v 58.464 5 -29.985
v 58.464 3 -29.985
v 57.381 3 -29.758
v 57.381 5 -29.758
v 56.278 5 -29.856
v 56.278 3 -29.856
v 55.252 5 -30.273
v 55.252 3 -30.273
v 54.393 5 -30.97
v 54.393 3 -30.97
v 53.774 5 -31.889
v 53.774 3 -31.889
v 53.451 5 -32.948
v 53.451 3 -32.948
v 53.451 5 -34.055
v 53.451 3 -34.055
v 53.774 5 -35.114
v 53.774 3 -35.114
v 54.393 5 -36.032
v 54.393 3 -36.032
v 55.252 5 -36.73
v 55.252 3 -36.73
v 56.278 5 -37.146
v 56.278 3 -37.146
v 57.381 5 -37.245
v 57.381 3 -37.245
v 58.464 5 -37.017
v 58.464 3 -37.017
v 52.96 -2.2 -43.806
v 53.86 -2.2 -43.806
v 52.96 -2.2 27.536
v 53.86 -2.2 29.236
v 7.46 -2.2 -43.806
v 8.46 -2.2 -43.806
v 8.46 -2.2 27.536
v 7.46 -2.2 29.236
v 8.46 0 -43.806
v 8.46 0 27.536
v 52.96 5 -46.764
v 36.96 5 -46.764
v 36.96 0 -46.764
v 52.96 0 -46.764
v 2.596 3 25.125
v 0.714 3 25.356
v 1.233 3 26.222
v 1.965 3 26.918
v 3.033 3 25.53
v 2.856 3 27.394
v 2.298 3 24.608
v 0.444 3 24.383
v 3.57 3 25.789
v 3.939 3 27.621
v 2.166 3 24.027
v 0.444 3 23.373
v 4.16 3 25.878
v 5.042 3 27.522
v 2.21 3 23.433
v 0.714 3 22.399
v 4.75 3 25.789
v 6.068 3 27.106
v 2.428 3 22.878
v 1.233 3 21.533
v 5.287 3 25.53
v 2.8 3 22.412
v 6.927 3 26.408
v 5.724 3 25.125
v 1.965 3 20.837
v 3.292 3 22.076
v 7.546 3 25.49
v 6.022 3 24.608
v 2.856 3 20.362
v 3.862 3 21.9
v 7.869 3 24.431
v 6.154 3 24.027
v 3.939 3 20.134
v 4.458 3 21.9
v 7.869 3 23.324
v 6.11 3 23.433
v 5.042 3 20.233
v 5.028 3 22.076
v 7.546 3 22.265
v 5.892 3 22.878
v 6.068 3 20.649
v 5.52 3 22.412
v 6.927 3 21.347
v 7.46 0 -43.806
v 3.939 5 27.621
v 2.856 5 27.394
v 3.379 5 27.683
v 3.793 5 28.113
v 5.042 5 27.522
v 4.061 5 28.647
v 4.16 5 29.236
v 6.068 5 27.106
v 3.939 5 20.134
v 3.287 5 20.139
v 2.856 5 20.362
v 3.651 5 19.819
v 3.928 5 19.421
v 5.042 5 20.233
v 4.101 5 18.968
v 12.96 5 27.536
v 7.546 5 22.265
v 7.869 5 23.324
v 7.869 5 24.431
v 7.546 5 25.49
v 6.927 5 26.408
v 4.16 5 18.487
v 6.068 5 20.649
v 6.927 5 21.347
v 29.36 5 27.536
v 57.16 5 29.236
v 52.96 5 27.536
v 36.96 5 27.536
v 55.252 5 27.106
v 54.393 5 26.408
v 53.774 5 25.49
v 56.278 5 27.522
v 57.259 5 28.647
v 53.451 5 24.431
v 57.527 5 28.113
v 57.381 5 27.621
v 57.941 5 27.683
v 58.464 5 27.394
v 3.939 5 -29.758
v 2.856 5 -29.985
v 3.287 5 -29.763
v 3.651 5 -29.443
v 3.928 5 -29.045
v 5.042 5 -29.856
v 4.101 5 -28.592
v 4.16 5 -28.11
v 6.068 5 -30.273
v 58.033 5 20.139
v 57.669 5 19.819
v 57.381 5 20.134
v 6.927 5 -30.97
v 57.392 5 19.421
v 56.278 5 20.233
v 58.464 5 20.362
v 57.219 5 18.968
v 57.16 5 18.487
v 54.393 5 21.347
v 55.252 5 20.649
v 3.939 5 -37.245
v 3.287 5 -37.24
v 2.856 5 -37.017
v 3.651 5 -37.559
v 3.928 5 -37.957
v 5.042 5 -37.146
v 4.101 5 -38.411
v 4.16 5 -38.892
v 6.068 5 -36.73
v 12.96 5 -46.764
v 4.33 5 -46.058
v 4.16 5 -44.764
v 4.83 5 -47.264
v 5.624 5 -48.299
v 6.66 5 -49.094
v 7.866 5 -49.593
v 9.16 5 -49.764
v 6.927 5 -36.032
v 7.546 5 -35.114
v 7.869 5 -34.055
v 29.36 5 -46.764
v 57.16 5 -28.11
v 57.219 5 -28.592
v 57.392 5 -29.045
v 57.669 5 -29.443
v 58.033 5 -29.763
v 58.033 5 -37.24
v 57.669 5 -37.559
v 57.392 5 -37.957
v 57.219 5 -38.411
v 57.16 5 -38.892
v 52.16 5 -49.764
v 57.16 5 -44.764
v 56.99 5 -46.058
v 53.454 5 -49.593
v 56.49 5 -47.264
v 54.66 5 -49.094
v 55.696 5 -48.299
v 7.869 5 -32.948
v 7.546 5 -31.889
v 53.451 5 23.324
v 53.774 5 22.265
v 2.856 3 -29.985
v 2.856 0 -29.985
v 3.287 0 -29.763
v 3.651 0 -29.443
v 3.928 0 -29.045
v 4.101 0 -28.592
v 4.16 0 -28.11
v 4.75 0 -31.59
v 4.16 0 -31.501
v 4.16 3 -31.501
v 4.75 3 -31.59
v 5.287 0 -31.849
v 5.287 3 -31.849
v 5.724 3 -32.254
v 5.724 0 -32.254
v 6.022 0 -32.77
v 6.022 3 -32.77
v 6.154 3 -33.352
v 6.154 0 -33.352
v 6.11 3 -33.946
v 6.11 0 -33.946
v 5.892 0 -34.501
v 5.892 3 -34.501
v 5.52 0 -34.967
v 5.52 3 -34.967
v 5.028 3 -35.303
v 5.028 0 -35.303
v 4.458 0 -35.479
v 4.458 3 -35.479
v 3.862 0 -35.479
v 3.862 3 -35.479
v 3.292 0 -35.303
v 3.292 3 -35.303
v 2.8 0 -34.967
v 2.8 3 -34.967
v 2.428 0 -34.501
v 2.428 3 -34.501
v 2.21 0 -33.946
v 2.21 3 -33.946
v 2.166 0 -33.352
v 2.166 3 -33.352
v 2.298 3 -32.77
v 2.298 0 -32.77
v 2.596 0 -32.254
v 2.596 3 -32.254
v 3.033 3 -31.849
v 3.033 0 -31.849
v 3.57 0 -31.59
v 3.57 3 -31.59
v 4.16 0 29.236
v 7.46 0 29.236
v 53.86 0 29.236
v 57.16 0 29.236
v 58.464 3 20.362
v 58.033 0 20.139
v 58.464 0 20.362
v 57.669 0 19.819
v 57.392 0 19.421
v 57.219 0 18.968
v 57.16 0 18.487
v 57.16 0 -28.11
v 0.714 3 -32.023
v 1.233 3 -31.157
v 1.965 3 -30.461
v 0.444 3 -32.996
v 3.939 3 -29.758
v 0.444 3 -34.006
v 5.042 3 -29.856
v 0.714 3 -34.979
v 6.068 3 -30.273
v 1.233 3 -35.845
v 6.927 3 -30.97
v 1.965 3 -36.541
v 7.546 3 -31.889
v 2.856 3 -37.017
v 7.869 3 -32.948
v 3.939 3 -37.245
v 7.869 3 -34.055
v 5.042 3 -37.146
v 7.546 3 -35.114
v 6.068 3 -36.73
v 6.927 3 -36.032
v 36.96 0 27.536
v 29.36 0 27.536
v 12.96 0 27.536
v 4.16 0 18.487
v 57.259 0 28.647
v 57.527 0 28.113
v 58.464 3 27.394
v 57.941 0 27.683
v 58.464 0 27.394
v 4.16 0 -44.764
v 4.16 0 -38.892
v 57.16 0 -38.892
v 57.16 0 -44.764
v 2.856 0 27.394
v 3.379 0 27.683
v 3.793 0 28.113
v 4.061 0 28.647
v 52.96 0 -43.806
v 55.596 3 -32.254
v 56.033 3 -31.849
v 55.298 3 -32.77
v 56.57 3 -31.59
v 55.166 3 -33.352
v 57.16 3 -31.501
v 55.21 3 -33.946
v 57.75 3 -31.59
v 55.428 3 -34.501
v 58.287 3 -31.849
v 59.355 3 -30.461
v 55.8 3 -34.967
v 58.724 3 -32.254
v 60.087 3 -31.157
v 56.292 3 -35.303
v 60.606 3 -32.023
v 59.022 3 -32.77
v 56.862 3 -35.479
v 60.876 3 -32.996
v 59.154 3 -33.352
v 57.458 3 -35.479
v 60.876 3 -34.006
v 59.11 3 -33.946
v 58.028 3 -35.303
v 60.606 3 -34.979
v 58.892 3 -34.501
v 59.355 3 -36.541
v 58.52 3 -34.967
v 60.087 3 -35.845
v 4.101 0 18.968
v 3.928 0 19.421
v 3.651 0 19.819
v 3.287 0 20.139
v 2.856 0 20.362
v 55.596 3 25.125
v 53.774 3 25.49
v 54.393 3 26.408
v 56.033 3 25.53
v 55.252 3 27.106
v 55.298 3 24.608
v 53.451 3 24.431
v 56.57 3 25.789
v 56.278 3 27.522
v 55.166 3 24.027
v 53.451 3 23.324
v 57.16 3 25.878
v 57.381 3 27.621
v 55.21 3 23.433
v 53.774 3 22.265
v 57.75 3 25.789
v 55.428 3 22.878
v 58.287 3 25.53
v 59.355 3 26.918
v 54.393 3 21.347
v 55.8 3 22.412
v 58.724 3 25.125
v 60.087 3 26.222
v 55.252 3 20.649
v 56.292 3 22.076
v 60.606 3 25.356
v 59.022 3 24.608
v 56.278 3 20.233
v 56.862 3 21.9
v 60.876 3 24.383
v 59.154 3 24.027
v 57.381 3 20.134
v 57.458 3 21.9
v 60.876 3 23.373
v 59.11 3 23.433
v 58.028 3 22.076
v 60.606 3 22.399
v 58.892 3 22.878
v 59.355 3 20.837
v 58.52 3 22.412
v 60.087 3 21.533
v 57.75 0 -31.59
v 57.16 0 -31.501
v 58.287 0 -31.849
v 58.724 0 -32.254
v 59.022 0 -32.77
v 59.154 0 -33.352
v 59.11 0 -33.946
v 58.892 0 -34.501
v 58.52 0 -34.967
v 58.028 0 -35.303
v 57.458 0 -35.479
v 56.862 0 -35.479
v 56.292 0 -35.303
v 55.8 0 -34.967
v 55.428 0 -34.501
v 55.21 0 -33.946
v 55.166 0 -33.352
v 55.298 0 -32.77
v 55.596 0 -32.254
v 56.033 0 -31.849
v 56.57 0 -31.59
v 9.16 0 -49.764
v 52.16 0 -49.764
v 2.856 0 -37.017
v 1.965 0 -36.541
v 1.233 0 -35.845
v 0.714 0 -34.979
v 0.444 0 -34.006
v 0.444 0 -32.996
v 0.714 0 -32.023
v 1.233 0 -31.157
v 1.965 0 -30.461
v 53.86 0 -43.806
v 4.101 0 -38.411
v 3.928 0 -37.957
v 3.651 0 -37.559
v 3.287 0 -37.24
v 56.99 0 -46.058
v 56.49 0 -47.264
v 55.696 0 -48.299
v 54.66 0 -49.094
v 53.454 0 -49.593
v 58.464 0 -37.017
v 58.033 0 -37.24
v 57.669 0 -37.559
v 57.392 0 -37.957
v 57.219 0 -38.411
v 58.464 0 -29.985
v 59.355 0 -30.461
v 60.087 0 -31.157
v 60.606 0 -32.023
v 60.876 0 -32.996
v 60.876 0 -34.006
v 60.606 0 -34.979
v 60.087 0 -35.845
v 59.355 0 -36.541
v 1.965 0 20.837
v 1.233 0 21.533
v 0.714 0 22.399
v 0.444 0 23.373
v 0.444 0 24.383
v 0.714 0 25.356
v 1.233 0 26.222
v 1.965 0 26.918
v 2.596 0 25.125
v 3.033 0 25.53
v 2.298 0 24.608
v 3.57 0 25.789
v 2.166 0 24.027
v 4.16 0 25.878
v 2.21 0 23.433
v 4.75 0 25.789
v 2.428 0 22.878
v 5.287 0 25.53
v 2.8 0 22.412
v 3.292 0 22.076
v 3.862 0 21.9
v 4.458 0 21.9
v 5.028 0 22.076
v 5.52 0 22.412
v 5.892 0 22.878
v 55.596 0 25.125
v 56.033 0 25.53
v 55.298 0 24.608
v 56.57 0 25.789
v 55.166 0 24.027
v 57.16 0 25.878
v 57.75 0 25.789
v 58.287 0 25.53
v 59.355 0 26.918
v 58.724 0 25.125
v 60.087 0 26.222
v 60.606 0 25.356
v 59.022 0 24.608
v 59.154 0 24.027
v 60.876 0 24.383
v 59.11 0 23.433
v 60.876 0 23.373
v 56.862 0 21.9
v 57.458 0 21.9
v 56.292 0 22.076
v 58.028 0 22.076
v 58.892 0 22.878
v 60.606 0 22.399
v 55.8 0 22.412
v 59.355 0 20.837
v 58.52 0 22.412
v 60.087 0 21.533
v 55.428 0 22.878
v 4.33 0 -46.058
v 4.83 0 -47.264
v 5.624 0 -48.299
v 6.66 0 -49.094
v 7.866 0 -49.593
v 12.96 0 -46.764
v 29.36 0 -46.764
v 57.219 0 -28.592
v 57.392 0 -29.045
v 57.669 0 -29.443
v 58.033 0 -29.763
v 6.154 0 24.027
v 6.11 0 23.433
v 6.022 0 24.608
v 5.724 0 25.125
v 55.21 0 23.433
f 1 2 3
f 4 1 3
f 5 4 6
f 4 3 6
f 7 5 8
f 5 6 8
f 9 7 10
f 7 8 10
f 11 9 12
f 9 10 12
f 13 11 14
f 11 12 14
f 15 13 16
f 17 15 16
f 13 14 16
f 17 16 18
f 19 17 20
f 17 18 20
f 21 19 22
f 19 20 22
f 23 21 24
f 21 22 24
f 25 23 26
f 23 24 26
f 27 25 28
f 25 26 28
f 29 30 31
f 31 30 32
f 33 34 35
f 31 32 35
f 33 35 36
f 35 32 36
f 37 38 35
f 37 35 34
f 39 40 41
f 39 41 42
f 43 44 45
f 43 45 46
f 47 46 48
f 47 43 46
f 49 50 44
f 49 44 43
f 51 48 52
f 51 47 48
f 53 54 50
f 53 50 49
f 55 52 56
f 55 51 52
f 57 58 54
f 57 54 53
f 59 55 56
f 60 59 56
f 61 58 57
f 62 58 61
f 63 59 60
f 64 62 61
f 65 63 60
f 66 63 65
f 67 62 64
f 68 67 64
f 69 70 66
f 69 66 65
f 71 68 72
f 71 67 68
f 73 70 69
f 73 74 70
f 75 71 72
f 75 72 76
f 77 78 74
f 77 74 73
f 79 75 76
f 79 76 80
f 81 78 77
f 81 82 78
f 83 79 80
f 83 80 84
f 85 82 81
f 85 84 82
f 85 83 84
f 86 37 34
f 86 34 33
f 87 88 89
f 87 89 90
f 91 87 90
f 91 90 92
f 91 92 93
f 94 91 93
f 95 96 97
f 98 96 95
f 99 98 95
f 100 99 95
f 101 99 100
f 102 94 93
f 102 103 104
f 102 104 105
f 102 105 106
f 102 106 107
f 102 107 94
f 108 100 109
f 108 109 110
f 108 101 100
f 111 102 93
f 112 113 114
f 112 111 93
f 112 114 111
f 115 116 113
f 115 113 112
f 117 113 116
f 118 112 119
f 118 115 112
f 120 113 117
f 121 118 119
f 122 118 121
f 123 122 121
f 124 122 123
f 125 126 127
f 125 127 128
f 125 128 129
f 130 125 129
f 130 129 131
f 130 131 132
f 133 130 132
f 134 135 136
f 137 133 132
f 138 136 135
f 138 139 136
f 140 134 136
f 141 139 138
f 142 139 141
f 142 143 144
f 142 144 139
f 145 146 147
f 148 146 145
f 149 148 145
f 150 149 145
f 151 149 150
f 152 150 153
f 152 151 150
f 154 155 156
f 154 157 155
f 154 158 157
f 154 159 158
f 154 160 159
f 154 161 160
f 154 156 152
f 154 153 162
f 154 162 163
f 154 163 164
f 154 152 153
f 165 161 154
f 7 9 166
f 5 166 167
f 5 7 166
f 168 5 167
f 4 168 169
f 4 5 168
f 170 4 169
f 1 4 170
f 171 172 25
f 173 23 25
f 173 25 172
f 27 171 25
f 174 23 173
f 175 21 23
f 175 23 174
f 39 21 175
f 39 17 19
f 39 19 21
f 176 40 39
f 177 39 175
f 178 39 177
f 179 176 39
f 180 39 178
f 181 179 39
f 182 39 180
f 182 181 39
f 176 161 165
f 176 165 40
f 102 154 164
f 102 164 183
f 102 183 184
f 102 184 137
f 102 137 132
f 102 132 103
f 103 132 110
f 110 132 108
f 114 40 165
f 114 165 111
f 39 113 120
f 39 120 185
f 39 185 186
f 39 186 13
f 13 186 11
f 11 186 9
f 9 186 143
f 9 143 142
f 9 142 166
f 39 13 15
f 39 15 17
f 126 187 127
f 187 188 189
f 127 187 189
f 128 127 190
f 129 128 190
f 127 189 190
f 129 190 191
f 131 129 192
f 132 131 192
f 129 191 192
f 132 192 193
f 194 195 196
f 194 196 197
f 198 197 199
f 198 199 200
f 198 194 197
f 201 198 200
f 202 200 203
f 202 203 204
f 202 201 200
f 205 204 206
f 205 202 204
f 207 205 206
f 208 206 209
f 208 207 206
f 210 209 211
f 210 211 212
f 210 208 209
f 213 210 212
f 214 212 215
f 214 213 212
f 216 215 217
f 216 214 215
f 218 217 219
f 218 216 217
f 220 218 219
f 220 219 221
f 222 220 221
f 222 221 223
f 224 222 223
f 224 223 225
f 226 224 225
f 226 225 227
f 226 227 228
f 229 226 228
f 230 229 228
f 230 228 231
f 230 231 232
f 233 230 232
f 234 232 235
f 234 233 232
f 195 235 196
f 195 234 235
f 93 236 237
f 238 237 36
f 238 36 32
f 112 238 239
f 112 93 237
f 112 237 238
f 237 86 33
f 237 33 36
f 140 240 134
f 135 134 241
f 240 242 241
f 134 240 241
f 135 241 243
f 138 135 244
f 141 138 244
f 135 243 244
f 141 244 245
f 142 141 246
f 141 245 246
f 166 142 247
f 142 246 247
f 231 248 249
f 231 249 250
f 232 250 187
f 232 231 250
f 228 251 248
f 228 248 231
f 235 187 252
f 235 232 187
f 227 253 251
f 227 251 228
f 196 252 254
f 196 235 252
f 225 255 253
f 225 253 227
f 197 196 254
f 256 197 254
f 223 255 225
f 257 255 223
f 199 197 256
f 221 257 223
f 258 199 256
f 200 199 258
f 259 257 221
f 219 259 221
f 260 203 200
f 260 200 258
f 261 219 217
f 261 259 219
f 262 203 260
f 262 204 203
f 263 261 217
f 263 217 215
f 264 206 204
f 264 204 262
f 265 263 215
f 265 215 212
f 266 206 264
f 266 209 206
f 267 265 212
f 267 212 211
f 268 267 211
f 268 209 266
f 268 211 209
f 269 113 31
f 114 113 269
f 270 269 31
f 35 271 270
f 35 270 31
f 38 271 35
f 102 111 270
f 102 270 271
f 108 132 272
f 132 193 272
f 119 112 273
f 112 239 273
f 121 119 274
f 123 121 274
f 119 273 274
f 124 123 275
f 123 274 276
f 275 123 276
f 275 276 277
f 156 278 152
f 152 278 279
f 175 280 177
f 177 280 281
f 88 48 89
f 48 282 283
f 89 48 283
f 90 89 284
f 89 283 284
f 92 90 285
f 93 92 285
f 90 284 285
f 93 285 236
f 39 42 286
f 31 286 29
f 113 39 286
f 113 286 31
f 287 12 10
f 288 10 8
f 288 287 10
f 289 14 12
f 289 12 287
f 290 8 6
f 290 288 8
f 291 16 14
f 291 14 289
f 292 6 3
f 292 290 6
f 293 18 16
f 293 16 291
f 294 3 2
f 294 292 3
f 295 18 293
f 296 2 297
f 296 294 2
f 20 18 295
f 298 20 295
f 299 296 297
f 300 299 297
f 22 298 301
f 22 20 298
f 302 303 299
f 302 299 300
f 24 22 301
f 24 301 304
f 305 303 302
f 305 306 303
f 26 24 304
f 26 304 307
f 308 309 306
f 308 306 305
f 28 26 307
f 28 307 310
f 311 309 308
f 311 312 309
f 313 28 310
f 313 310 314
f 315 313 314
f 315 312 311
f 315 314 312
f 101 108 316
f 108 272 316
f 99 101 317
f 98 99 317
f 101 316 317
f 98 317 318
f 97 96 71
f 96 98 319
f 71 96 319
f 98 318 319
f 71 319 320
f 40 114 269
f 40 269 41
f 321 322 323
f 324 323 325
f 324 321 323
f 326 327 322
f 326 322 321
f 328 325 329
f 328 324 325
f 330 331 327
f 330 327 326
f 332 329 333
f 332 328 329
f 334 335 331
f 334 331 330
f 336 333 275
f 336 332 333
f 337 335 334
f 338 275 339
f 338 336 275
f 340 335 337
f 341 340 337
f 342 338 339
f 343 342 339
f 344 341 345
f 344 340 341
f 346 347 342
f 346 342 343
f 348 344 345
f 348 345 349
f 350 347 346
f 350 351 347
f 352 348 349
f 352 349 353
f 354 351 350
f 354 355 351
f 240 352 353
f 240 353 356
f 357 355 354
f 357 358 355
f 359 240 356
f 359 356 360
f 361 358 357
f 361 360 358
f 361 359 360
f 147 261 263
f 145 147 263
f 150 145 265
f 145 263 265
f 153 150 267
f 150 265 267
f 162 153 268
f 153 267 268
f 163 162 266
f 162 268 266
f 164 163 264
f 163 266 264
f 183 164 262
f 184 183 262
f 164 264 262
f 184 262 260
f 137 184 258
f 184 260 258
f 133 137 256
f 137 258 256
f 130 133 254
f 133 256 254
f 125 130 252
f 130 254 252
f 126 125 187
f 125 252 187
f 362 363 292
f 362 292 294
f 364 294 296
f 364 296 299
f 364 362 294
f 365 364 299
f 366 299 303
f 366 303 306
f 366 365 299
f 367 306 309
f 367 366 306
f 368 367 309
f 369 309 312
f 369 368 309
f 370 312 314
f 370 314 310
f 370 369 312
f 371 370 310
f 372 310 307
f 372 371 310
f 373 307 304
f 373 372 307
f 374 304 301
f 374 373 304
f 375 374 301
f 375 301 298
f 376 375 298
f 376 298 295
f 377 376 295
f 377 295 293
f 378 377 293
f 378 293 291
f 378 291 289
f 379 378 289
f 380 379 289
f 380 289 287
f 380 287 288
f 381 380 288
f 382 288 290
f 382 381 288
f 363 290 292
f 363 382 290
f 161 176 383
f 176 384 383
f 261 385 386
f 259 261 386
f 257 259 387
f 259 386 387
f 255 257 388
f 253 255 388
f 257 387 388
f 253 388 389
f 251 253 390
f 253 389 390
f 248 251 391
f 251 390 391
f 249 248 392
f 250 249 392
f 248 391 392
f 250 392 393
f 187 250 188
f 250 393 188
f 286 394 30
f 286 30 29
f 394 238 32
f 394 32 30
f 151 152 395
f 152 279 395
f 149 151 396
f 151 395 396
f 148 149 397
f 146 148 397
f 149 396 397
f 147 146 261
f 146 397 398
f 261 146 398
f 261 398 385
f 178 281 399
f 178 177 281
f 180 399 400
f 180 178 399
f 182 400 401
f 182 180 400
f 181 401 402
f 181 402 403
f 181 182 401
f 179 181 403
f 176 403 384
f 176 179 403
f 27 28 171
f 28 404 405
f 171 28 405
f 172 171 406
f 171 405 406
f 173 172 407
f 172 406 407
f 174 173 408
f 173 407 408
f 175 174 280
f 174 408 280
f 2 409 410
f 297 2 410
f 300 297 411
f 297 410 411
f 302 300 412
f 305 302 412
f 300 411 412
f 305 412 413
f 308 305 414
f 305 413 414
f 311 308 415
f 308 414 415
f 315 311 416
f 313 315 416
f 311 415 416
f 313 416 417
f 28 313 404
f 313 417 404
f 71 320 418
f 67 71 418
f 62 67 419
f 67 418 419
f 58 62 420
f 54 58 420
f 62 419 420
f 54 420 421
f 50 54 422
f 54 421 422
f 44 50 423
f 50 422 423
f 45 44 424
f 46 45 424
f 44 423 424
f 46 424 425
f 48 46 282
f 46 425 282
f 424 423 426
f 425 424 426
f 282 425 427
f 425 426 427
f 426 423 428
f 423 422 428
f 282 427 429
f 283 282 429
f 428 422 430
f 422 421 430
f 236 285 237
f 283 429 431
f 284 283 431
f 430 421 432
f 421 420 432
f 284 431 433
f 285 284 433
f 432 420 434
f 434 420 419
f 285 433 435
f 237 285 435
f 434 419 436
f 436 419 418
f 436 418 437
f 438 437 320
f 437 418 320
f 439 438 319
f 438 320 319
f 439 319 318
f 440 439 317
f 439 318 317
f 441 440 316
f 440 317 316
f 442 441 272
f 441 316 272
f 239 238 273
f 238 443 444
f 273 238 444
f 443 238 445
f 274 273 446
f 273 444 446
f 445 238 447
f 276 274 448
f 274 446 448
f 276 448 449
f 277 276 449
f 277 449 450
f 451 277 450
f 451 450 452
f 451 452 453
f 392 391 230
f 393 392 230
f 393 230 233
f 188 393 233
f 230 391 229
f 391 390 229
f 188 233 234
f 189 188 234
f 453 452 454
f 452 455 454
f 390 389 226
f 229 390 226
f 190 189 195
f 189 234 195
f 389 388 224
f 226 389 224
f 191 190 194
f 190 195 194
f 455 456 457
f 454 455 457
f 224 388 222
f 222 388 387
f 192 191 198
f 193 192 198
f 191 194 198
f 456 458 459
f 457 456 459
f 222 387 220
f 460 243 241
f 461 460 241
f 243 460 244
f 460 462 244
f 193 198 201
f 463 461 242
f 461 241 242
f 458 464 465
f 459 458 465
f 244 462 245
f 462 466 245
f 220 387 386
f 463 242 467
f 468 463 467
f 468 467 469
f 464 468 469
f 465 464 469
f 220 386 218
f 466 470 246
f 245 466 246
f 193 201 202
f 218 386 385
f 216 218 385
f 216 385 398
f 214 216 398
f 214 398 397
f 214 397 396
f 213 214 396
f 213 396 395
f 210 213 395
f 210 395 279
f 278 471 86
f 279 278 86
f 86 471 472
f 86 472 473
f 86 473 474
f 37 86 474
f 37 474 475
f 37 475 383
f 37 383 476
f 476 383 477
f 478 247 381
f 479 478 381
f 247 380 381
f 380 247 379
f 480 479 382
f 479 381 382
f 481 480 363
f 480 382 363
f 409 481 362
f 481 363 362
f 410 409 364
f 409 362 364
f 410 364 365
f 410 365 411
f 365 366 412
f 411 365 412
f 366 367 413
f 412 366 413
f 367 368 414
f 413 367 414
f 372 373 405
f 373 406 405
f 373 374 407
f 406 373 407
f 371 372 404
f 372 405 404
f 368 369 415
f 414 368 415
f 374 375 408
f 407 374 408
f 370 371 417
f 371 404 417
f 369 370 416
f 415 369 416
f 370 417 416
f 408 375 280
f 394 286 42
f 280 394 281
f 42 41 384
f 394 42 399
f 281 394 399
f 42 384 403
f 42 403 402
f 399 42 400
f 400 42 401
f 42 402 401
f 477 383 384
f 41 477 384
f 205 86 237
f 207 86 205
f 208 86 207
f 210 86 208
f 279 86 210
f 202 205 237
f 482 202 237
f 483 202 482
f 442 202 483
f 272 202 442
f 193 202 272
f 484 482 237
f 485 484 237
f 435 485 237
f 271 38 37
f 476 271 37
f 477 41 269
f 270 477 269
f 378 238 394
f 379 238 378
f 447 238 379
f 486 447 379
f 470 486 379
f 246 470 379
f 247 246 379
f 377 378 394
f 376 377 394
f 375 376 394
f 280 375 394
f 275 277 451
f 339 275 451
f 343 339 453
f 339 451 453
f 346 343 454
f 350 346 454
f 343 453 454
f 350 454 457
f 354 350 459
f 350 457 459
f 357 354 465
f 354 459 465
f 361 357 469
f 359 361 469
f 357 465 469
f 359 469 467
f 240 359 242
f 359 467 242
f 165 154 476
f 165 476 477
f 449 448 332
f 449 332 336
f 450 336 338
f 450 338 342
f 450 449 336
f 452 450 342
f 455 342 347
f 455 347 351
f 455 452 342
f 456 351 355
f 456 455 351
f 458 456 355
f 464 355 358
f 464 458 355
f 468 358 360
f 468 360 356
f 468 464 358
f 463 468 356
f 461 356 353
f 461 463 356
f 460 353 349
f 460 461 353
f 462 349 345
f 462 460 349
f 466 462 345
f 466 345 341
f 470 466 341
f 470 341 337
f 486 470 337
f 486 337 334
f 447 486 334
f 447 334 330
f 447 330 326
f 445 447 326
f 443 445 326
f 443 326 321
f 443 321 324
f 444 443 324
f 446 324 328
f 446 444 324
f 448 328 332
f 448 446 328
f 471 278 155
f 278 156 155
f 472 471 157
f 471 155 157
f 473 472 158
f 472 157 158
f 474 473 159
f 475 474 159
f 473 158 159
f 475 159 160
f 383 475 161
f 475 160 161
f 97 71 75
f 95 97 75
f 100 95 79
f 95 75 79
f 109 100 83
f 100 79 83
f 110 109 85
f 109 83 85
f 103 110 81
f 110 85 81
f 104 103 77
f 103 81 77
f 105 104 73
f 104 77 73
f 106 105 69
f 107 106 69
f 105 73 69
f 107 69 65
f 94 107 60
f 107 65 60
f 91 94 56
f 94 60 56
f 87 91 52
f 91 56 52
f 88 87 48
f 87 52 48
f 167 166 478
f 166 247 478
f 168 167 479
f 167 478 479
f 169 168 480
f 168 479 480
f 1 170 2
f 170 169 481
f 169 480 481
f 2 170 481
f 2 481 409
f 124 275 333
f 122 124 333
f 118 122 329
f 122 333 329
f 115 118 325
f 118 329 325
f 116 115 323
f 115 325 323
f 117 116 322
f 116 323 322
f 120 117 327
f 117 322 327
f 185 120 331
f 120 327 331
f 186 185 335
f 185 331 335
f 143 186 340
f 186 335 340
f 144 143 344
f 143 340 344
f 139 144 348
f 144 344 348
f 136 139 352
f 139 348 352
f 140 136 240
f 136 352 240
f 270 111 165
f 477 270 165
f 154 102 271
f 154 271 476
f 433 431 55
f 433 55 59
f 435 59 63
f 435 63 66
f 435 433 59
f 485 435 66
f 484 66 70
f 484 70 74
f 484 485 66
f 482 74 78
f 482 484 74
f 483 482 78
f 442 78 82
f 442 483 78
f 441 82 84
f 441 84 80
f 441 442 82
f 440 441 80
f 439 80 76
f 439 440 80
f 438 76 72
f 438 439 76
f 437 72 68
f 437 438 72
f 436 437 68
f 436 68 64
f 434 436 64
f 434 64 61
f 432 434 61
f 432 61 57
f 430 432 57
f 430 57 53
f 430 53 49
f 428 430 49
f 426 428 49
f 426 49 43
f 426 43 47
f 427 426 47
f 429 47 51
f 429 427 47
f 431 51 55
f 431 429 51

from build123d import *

# Parameters (mm, degrees)
SKETCH2_R           = 2
BOSS_EXTRUDE1_DEPTH = 3
BOSS_EXTRUDE2_DEPTH = 2
FILLET1_R           = 5
SKETCH4_W           = 16
SKETCH4_H           = 74.3
SKETCH4_W_2         = 16.4
CUT_EXTRUDE1_DEPTH  = 10
BOSS_EXTRUDE3_DEPTH = 2.2


with BuildPart() as part:
    # Sketch2 → Boss-Extrude1 (new body)
    with BuildSketch(Plane(origin=(0, 0, 0), x_dir=(1, 0, 0), z_dir=(0, 1, 0))):
        with BuildLine():
            Line((57.160001108, 49.763863032), (4.160001108, 49.763863032))
            Line((4.160001108, 49.763863032), (4.160001108, 38.892058935))
            ThreePointArc((4.160001108, 38.892058935), (3.801845246, 37.749978453), (2.855653282, 37.016940791))
            ThreePointArc((2.855653282, 37.016940791), (0.410001108, 33.501094271), (2.855653282, 29.985247752))
            ThreePointArc((2.855653282, 29.985247752), (3.801845246, 29.25221009), (4.160001108, 28.110129608))
            Line((4.160001108, 28.110129608), (4.160001108, -18.486673333))
            ThreePointArc((4.160001108, -18.486673333), (3.801845246, -19.628753814), (2.855653282, -20.361791477))
            ThreePointArc((2.855653282, -20.361791477), (0.410001109, -23.877730206), (2.855826188, -27.393548657))
            ThreePointArc((2.855826188, -27.393548657), (3.792729548, -28.113251523), (4.160001108, -29.236136968))
            Line((4.160001108, -29.236136968), (7.160001108, -29.236136968))
            Line((7.160001108, -29.236136968), (54.160001108, -29.236136968))
            Line((54.160001108, -29.236136968), (57.160001108, -29.236136968))
            ThreePointArc((57.160001108, -29.236136968), (57.527272669, -28.113251523), (58.464176029, -27.393548657))
            ThreePointArc((58.464176029, -27.393548657), (60.910001107, -23.877730206), (58.464348934, -20.361791477))
            ThreePointArc((58.464348934, -20.361791477), (57.51815697, -19.628753814), (57.160001108, -18.486673333))
            Line((57.160001108, -18.486673333), (57.160001108, 28.110129608))
            ThreePointArc((57.160001108, 28.110129608), (57.51815697, 29.25221009), (58.464348934, 29.985247752))
            ThreePointArc((58.464348934, 29.985247752), (60.910001108, 33.501094271), (58.464348934, 37.016940791))
            ThreePointArc((58.464348934, 37.016940791), (57.51815697, 37.749978453), (57.160001108, 38.892058935))
            Line((57.160001108, 38.892058935), (57.160001108, 49.763863032))
        make_face()
        with Locations(Location((4.160001108, 33.501094271, 0), (0, 0, 270))):
            Circle(SKETCH2_R, mode=Mode.SUBTRACT)
        with Locations(Location((57.160001108, 33.501094271, 0), (0, 0, 270))):
            Circle(SKETCH2_R, mode=Mode.SUBTRACT)
        with Locations(Location((57.160001108, -23.877637996, 0), (0, 0, 270))):
            Circle(SKETCH2_R, mode=Mode.SUBTRACT)
        with Locations(Location((4.160001108, -23.877637996, 0), (0, 0, 270))):
            Circle(SKETCH2_R, mode=Mode.SUBTRACT)
    extrude(amount=BOSS_EXTRUDE1_DEPTH)

    # Sketch3 → Boss-Extrude2 (add)
    with BuildSketch(Plane(origin=(0, 3, 0), x_dir=(1, 0, 0), z_dir=(0, 1, 0))):
        with BuildLine():
            Line((57.160001108, 38.892058935), (57.160001108, 49.763863032))
            Line((57.160001108, 49.763863032), (4.160001108, 49.763863032))
            Line((4.160001108, 49.763863032), (4.160001108, 38.892058935))
            ThreePointArc((4.160001108, 38.892058935), (3.801845246, 37.749978453), (2.855653282, 37.016940791))
            ThreePointArc((2.855653282, 37.016940791), (7.910001108, 33.501094271), (2.855653282, 29.985247752))
            ThreePointArc((2.855653282, 29.985247752), (3.801845246, 29.25221009), (4.160001108, 28.110129608))
            Line((4.160001108, 28.110129608), (4.160001108, -18.486673333))
            ThreePointArc((4.160001108, -18.486673333), (3.801845246, -19.628753814), (2.855653282, -20.361791477))
            ThreePointArc((2.855653282, -20.361791477), (7.910001107, -23.877545787), (2.855826188, -27.393548657))
            ThreePointArc((2.855826188, -27.393548657), (3.792729548, -28.113251523), (4.160001108, -29.236136968))
            Line((4.160001108, -29.236136968), (57.160001108, -29.236136968))
            ThreePointArc((57.160001108, -29.236136968), (57.527272669, -28.113251523), (58.464176029, -27.393548657))
            ThreePointArc((58.464176029, -27.393548657), (53.410001109, -23.877545787), (58.464348934, -20.361791477))
            ThreePointArc((58.464348934, -20.361791477), (57.51815697, -19.628753814), (57.160001108, -18.486673333))
            Line((57.160001108, -18.486673333), (57.160001108, 28.110129608))
            ThreePointArc((57.160001108, 28.110129608), (57.51815697, 29.25221009), (58.464348934, 29.985247752))
            ThreePointArc((58.464348934, 29.985247752), (53.410001108, 33.501094271), (58.464348934, 37.016940791))
            ThreePointArc((58.464348934, 37.016940791), (57.51815697, 37.749978453), (57.160001108, 38.892058935))
        make_face()
    extrude(amount=BOSS_EXTRUDE2_DEPTH)

    # Fillet1
    fillet1_edges = [part.edges().sort_by_distance(p)[0] for p in [
        (4.160001108, 2.5, -49.763863032),
        (57.160001108, 2.5, -49.763863032),
    ]]
    fillet(fillet1_edges, radius=FILLET1_R)

    # Sketch4 → Cut-Extrude1 (cut)
    with BuildSketch(Plane(origin=(0, 5, 0), x_dir=(1, 0, 0), z_dir=(0, 1, 0))):
        with Locations((44.960001108, 9.613863032)):
            Rectangle(SKETCH4_W, SKETCH4_H)
        with Locations((21.160001108, 9.613863032)):
            Rectangle(SKETCH4_W_2, SKETCH4_H)
    extrude(amount=-CUT_EXTRUDE1_DEPTH, mode=Mode.SUBTRACT)

    # Sketch7 → Boss-Extrude3 (add)
    with BuildSketch(Plane.XZ):
        Polygon((53.860001108, 29.236136968), (53.860001108, -43.805670275), (52.960001108, -43.805670275), (52.960001108, 27.536136968), (8.460001108, 27.536136968), (8.460001108, -43.805670275), (7.460001108, -43.805670275), (7.460001108, 29.236136968), align=None)
    extrude(amount=BOSS_EXTRUDE3_DEPTH)


solid = part.part
